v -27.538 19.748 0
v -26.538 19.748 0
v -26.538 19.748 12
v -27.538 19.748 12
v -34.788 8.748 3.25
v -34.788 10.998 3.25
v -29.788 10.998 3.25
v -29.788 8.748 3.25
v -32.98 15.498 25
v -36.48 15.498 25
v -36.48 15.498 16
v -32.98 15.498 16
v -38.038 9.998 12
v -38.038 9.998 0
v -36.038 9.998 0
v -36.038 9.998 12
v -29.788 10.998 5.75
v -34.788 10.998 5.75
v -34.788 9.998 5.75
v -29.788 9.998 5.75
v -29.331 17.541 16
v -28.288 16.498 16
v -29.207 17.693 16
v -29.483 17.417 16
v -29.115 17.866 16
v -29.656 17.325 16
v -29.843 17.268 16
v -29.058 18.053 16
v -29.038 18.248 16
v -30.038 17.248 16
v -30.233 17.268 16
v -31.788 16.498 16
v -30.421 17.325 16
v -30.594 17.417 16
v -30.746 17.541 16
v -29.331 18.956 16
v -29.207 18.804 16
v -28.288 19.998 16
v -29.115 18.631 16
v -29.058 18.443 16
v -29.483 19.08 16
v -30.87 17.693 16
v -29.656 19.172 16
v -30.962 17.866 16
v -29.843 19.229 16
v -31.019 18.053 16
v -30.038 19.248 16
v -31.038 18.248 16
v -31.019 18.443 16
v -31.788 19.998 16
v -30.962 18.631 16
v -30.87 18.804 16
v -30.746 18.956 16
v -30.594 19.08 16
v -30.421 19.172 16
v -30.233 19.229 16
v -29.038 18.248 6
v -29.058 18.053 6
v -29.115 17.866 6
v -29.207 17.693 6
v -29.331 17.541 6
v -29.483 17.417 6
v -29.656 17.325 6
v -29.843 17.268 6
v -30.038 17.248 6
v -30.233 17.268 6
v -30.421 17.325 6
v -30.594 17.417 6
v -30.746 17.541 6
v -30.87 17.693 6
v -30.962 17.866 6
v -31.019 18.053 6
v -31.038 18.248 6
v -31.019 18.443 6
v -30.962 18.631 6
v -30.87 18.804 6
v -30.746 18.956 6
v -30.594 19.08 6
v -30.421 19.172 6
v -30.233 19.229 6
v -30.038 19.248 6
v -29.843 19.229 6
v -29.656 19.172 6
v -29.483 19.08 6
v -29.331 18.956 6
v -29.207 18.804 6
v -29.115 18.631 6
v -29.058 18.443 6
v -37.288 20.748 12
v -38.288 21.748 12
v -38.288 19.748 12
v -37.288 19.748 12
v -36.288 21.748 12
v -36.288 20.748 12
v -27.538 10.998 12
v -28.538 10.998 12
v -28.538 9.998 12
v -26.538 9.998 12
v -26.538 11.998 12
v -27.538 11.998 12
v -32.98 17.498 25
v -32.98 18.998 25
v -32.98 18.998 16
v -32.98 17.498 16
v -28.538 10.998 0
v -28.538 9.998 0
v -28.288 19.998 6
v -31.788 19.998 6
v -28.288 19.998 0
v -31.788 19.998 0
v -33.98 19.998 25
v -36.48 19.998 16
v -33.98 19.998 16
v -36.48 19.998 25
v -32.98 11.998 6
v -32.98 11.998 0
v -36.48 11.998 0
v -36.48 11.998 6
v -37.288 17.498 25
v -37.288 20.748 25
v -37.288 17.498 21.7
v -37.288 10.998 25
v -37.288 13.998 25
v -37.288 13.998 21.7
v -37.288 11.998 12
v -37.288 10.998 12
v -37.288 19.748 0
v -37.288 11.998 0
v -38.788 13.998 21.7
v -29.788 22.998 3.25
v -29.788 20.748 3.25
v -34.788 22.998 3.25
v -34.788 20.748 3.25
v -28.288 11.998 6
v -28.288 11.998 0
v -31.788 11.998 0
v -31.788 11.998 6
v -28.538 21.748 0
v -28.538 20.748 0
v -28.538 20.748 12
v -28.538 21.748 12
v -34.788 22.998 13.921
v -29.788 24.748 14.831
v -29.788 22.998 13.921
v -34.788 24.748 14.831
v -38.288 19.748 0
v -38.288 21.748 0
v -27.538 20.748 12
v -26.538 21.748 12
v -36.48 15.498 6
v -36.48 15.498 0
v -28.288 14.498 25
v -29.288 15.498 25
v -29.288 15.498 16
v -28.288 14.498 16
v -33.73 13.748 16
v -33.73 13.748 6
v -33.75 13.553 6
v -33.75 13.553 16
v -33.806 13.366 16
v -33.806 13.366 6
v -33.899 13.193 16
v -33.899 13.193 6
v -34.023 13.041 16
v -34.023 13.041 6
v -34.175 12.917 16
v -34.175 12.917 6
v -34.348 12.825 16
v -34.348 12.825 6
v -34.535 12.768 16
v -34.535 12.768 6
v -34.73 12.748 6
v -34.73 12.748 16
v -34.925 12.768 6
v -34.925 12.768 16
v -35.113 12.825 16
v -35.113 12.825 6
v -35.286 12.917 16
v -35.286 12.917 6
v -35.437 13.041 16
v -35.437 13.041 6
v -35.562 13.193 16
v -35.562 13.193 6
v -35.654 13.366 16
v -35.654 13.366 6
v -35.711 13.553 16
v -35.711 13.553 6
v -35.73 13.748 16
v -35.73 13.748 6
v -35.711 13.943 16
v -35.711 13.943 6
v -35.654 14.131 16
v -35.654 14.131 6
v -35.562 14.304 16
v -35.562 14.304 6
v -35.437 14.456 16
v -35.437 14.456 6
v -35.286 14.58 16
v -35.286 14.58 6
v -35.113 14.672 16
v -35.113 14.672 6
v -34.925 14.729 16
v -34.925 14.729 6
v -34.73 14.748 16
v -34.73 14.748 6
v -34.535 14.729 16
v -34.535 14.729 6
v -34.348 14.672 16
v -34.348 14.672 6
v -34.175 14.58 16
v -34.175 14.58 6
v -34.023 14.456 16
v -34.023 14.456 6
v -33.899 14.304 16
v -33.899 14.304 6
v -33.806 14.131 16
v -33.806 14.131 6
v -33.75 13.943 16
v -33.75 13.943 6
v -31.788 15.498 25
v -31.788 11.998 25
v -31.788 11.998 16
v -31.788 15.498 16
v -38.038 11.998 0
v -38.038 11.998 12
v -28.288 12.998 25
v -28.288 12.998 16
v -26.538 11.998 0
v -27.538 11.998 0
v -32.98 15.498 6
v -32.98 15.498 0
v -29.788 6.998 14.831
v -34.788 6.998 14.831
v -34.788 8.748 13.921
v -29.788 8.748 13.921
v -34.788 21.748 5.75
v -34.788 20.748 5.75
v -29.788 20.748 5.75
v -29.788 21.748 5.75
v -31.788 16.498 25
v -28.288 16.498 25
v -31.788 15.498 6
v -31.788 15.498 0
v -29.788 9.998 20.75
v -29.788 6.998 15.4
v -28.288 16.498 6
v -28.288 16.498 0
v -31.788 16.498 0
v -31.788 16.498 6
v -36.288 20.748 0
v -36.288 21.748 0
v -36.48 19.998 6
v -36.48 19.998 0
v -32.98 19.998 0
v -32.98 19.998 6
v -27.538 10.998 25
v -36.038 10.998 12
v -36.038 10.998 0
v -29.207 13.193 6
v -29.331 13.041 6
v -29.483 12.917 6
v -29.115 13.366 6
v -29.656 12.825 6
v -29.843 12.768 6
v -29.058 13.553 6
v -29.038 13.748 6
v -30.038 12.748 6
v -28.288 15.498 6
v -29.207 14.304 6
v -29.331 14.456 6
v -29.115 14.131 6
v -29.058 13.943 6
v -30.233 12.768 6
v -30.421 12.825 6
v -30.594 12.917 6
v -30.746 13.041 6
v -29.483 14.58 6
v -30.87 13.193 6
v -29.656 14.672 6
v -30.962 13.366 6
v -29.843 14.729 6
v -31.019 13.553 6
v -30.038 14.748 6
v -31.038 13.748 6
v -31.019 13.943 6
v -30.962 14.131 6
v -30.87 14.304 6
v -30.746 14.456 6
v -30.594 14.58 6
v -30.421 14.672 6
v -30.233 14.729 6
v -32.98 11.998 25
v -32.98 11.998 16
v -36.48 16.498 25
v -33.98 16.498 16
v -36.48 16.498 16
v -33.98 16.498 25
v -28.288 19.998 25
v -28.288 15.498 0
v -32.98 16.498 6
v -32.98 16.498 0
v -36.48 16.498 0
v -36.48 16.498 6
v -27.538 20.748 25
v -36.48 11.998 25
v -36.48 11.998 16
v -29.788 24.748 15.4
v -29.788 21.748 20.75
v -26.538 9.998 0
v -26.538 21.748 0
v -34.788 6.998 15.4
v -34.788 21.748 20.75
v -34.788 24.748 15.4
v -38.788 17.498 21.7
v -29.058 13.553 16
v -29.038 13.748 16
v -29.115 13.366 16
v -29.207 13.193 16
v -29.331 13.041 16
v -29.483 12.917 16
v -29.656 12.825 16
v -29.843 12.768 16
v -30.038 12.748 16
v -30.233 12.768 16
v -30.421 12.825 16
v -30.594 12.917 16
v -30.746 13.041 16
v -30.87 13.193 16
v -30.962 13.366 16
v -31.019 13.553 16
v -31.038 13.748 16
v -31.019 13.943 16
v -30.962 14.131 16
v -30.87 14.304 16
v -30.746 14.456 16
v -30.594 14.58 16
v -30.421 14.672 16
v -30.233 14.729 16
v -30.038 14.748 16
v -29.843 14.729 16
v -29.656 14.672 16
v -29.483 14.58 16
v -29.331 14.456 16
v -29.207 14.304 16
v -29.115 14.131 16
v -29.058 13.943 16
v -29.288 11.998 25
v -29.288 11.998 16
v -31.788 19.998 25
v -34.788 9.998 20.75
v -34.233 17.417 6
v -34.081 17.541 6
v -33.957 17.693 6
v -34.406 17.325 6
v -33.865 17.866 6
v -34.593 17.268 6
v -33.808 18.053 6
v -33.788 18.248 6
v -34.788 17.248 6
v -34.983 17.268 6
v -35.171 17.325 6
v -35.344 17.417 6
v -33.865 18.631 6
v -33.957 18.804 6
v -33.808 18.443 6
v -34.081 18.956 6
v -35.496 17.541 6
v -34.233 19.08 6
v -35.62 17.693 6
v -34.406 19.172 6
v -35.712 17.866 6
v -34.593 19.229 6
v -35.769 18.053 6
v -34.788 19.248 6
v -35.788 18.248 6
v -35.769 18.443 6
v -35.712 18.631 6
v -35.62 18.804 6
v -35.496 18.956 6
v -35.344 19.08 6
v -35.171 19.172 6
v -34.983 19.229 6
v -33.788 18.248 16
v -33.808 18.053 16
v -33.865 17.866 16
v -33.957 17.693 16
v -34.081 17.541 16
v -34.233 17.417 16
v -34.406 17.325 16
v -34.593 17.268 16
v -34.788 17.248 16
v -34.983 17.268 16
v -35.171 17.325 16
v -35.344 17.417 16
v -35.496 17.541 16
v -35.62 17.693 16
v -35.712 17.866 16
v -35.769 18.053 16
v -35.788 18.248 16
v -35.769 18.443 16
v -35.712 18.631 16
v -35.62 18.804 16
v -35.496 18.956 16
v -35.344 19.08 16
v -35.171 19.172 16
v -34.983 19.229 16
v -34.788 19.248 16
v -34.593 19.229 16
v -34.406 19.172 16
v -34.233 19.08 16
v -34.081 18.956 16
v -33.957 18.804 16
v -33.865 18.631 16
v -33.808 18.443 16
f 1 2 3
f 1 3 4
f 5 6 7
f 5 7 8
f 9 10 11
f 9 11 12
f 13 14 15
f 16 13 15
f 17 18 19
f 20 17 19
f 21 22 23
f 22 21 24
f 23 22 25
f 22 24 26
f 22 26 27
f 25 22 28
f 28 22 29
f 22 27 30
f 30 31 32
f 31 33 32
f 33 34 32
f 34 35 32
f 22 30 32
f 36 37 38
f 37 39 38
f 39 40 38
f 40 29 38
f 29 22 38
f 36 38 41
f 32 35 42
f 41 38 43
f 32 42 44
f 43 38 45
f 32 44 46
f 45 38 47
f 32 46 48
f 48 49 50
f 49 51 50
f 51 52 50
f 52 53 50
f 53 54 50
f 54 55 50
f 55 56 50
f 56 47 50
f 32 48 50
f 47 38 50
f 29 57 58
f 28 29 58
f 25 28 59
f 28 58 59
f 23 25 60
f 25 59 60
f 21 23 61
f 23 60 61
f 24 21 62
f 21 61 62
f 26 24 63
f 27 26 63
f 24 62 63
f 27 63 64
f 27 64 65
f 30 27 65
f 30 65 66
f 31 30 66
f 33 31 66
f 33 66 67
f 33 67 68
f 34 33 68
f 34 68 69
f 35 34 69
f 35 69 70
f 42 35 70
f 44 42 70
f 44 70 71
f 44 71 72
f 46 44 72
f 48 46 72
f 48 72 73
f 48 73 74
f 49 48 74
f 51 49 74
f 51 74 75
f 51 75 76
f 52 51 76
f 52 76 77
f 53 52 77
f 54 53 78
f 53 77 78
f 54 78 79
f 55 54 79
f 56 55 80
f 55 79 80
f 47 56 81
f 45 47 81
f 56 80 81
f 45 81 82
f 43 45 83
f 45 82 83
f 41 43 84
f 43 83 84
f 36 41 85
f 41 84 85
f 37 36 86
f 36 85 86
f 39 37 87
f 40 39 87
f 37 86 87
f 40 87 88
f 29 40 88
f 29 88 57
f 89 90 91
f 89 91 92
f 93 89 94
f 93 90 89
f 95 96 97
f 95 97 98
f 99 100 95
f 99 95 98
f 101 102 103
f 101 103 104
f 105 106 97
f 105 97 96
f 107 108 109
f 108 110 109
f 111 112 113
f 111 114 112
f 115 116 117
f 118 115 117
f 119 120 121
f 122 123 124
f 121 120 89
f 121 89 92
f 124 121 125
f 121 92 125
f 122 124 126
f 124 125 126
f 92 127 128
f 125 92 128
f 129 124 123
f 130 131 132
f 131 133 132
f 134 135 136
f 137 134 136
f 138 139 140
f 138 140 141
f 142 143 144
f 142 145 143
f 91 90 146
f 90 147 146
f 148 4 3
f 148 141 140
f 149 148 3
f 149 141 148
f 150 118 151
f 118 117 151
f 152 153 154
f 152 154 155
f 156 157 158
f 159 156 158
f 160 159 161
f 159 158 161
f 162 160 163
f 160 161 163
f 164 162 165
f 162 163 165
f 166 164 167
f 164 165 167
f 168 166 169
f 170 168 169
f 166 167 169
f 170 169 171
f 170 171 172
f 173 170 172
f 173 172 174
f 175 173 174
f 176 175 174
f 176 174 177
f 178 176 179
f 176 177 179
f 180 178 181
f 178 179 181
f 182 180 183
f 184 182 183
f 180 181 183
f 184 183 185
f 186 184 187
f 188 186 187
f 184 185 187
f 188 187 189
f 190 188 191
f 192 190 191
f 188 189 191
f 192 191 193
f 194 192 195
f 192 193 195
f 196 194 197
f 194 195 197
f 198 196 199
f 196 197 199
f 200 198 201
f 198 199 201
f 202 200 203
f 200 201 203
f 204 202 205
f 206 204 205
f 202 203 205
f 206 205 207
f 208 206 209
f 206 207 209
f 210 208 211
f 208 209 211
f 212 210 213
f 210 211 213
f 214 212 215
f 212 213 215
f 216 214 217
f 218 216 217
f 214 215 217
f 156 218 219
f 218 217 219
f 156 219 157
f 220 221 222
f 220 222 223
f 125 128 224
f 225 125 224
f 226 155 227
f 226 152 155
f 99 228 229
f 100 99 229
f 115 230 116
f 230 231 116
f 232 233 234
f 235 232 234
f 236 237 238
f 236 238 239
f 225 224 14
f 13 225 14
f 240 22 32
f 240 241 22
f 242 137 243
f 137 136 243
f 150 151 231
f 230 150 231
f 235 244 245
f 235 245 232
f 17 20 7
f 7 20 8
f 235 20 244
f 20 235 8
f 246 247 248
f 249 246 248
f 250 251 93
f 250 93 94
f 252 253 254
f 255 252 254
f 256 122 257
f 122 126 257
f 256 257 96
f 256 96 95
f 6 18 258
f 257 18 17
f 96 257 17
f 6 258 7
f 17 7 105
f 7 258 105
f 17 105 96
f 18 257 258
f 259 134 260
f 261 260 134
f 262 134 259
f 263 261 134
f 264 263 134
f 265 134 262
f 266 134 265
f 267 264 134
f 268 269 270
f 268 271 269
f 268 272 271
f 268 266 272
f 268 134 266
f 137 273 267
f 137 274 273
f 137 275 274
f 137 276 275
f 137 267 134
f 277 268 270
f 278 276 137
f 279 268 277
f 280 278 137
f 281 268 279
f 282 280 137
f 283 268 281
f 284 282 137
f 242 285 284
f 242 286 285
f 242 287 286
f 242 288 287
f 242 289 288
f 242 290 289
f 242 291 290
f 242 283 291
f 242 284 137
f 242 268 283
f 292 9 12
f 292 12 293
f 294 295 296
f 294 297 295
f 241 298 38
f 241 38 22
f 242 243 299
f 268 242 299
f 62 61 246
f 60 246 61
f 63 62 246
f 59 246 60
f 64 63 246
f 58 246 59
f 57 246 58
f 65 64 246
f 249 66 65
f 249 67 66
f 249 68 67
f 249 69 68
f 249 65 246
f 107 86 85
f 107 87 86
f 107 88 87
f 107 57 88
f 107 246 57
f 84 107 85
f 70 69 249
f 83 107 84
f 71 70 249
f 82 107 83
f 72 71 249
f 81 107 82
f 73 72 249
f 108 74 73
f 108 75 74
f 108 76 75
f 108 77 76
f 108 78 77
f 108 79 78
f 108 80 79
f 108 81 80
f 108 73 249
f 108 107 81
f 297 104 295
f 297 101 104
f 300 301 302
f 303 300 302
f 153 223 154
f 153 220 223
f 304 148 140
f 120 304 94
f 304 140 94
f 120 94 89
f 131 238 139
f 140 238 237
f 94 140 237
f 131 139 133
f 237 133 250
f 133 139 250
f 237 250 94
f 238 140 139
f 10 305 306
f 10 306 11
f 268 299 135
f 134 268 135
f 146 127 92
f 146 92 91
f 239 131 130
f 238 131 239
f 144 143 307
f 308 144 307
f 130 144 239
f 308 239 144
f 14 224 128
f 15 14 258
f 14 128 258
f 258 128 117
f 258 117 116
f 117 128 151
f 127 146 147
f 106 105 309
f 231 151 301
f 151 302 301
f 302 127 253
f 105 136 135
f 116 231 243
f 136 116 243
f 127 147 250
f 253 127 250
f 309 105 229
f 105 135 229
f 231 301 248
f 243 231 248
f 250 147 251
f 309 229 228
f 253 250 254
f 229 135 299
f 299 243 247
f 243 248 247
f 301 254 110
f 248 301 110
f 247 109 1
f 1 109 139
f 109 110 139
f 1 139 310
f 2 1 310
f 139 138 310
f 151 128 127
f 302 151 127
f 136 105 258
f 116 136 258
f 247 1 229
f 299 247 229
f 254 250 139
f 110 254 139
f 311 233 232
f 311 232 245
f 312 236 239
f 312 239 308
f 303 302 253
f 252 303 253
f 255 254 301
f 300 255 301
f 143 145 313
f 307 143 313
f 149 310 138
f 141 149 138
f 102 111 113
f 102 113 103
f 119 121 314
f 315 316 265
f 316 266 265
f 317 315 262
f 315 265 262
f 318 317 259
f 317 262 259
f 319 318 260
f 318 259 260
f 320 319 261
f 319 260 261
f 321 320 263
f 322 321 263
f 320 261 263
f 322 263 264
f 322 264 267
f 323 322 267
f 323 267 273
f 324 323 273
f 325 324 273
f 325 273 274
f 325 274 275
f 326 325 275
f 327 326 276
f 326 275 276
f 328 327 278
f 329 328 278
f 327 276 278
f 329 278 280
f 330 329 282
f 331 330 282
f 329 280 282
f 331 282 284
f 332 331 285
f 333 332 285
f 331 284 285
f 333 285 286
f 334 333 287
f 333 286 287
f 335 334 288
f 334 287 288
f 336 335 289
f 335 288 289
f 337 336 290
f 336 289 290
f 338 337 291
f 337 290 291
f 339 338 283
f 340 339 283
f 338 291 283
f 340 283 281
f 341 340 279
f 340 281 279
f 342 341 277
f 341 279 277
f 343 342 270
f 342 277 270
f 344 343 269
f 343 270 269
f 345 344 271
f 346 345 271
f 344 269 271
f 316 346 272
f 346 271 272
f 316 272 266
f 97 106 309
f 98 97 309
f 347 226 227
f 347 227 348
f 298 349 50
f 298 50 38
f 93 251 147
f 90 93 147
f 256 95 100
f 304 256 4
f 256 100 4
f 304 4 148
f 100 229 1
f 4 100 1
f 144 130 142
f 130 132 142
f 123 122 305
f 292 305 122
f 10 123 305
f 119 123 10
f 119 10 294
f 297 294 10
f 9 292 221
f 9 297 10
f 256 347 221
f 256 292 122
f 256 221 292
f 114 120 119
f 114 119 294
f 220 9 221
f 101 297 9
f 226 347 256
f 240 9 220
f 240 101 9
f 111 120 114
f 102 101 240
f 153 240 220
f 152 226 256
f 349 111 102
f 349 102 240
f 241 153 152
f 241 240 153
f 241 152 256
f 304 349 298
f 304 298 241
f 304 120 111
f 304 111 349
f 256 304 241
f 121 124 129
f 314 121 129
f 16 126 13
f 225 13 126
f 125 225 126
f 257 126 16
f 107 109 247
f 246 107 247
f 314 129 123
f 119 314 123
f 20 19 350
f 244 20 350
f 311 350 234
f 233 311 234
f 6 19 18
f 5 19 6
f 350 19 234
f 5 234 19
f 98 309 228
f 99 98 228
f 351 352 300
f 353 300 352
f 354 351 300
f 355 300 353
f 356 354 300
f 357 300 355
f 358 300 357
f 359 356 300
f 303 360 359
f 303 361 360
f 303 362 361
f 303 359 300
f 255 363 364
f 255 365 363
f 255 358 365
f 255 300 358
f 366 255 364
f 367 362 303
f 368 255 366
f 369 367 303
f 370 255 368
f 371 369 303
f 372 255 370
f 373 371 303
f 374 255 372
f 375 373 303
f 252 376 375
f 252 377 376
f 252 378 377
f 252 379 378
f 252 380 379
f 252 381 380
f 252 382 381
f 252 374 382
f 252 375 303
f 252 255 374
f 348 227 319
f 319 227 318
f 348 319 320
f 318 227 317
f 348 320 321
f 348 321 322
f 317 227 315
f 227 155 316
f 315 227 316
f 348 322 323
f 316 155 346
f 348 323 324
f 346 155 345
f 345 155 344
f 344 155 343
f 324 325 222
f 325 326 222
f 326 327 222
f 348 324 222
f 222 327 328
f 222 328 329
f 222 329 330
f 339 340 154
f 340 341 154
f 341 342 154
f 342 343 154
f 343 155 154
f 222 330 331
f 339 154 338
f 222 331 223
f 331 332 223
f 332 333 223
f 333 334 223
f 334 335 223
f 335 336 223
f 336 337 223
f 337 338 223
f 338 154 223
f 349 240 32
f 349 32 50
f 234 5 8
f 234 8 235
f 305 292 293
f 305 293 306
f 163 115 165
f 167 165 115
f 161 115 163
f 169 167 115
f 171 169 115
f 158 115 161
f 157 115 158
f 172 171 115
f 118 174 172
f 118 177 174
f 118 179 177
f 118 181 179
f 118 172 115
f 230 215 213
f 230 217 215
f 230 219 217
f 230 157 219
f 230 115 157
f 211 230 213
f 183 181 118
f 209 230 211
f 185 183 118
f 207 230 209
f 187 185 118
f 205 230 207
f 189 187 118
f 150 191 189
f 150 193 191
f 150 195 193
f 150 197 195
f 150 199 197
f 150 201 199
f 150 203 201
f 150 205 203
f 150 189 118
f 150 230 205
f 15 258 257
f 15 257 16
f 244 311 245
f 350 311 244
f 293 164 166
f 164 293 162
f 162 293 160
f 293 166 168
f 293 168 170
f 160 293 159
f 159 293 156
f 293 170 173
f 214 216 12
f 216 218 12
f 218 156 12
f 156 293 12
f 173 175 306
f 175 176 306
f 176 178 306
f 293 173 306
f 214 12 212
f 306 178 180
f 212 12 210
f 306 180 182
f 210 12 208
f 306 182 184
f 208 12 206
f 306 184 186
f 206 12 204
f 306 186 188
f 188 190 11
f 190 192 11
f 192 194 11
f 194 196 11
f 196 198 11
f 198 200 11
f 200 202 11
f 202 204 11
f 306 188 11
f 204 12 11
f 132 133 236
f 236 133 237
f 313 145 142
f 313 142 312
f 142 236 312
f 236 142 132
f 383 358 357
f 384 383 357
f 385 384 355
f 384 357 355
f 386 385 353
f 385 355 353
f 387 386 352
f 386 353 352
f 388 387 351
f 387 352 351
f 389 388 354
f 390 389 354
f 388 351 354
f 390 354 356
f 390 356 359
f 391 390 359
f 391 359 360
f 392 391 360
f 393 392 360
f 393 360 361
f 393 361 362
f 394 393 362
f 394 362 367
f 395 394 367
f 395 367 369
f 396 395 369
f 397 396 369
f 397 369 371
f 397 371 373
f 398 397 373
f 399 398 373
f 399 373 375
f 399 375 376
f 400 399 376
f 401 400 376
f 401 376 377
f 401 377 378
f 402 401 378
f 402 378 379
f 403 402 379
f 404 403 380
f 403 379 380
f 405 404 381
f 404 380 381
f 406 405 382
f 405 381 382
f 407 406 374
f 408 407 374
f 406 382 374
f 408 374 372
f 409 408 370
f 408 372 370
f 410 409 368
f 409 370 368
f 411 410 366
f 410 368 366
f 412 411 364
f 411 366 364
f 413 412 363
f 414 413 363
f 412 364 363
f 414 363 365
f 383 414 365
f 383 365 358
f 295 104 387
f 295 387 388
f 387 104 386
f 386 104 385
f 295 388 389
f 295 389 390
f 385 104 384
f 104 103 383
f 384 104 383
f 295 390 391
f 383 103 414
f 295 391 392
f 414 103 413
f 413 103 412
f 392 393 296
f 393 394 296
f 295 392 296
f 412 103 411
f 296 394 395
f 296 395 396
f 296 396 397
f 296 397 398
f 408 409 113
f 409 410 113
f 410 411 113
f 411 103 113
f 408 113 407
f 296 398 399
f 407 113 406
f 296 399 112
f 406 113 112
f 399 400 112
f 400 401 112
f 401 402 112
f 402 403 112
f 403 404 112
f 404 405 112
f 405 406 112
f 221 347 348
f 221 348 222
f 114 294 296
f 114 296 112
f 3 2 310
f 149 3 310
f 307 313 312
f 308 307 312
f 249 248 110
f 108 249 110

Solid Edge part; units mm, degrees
sketch "Sketch1" plane through (0, 0, 0) normal (0, 0, 1) x (1, 0, 0)
  line L0 (-37.2884, 10.9984) -> (-27.5384, 10.9984)
  line L1 (-27.5384, 10.9984) -> (-27.5384, 20.7484)
  line L2 (-27.5384, 20.7484) -> (-37.2884, 20.7484)
  line L3 (-37.2884, 20.7484) -> (-37.2884, 10.9984)
  dimension "D1" = 9.75
  dimension "D2" = 9.75
extrude "Protrusion1" add sketch "Sketch1" along normal blind 25
sketch "Sketch2" plane through (-32.5384, 13.9984, 12.5) normal (0, -1, 0) x (0, 0, 1)
  line L0 (12.5, 4.75) -> (9.2, 4.75)
  line L1 (9.2, 4.75) -> (9.2, 6.25)
  line L2 (9.2, 6.25) -> (12.5, 4.75)
extrude "ExtrudedProtrusion_3" add sketch "Sketch2" against normal blind 3.5
sketch "Sketch3" plane through (-32.5384, 17.4984, 0) normal (0, 0, -1) x (0, 1, 0)
  line L0 (4.25, -3.75) -> (4.25, -5.75)
  line L1 (4.25, -5.75) -> (2.25, -5.75)
  line L2 (2.25, -3.75) -> (2.25, -5.75)
  line L3 (4.25, -3.75) -> (2.25, -3.75)
  line L4 (-5.5, -5.5) -> (-7.5, -5.5)
  line L5 (-7.5, -5.5) -> (-7.5, -3.5)
  line L6 (-5.5, -3.5) -> (-7.5, -3.5)
  line L7 (-5.5, -3.5) -> (-5.5, -5.5)
  line L8 (-7.5, 4) -> (-7.5, 6)
  line L9 (-7.5, 6) -> (-5.5, 6)
  line L10 (-5.5, 6) -> (-5.5, 4)
  line L11 (-7.5, 4) -> (-5.5, 4)
  line L12 (2.25, 6) -> (4.25, 6)
  line L13 (4.25, 6) -> (4.25, 4)
  line L14 (2.25, 4) -> (4.25, 4)
  line L15 (2.25, 6) -> (2.25, 4)
  dimension "D1" = 11.5
  dimension "D2" = 2
  dimension "D3" = 2
  dimension "D4" = 2
  dimension "D5" = 2
  dimension "D6" = 2
  dimension "D7" = 2
  dimension "D8" = 2
  dimension "D9" = 1
  dimension "D10" = 1
  dimension "D11" = 11.75
  dimension "D12" = 11.75
  dimension "D13" = 1
  dimension "D14" = 2
  dimension "D15" = 1
extrude "ExtrudedProtrusion_4" add sketch "Sketch3" against normal blind 12
sketch "Sketch4" plane through (-32.2884, 17.4984, 12.5) normal (1, 0, 0) x (0, -1, 0)
  line L0 (6.5, 9.25) -> (8.75, 9.25)
  line L1 (8.75, 9.25) -> (8.75, -1.4212)
  line L2 (10.5, -2.3314) -> (8.75, -1.4212)
  line L3 (10.5, -2.3314) -> (10.5, -2.9)
  line L4 (10.5, -2.9) -> (7.5, -8.25)
  line L5 (7.5, 6.75) -> (7.5, -8.25)
  line L6 (6.5, 6.75) -> (7.5, 6.75)
  line L7 (6.5, 9.25) -> (6.5, 6.75)
  line L8 (-3.25, 9.25) -> (-5.5, 9.25)
  line L9 (-5.5, 9.25) -> (-5.5, -1.4212)
  line L10 (-7.25, -2.3314) -> (-5.5, -1.4212)
  line L11 (-7.25, -2.3314) -> (-7.25, -2.9)
  line L12 (-7.25, -2.9) -> (-4.25, -8.25)
  line L13 (-4.25, 6.75) -> (-4.25, -8.25)
  line L14 (-3.25, 6.75) -> (-4.25, 6.75)
  line L15 (-3.25, 9.25) -> (-3.25, 6.75)
  dimension "D1" = 3.25
  dimension "D2" = 2.5
  dimension "D3" = 3
extrude "ExtrudedProtrusion_5" add sketch "Sketch4" along normal mid plane 5
sketch "Sketch5" plane through (-32.5384, 17.4984, 25) normal (0, 0, 1) x (0, 1, 0)
  line L0 (-1, -0.75) -> (2.5, -0.75)
  line L1 (2.5, -0.75) -> (2.5, -4.25)
  line L2 (2.5, -4.25) -> (-1, -4.25)
  line L3 (-1, -4.25) -> (-1, -0.75)
  line L4 (-1, 3.9418) -> (2.5, 3.9418)
  line L5 (2.5, 3.9418) -> (2.5, 1.4418)
  line L6 (2.5, 1.4418) -> (1.5, 0.4418)
  line L7 (1.5, 0.4418) -> (0, 0.4418)
  line L8 (0, 0.4418) -> (-1, 1.4418)
  line L9 (-1, 1.4418) -> (-1, 3.9418)
  line L10 (-5.5, 3.9418) -> (-2, 3.9418)
  line L11 (-2, 3.9418) -> (-2, 0.4418)
  line L12 (-2, 0.4418) -> (-5.5, 0.4418)
  line L13 (-5.5, 0.4418) -> (-5.5, 3.9418)
  line L14 (-5.5, -0.75) -> (-2, -0.75)
  line L15 (-2, -0.75) -> (-2, -3.25)
  line L16 (-2, -3.25) -> (-3, -4.25)
  line L17 (-3, -4.25) -> (-4.5, -4.25)
  line L18 (-4.5, -4.25) -> (-5.5, -3.25)
  line L19 (-5.5, -3.25) -> (-5.5, -0.75)
  dimension "D1" = 3.5
  dimension "D2" = 3.5
  dimension "D3" = 1
  dimension "D4" = 0.75
  dimension "D5" = 3.5
  dimension "D6" = 3.5
  dimension "D7" = 2.5
  dimension "D8" = 3.5
  dimension "D9" = 3.5
  dimension "D10" = 3.5
  dimension "D11" = 1
  dimension "D12" = 1
  dimension "D13" = 1
extrude "ExtrudedCutout_1" cut sketch "Sketch5" against normal blind 9
sketch "Sketch6" plane through (-32.5384, 17.4984, 0) normal (0, 0, -1) x (-1, 0, 0)
  line L0 (3.9419, -2) -> (0.4419, -2)
  line L1 (0.4419, -2) -> (0.4419, -5.5)
  line L2 (0.4419, -5.5) -> (3.9419, -5.5)
  line L3 (3.9419, -5.5) -> (3.9419, -2)
  line L4 (-0.75, -2) -> (-4.25, -2)
  line L5 (-4.25, -2) -> (-4.25, -5.5)
  line L6 (-4.25, -5.5) -> (-0.75, -5.5)
  line L7 (-0.75, -5.5) -> (-0.75, -2)
  line L8 (-0.75, 2.5) -> (-4.25, 2.5)
  line L9 (-4.25, 2.5) -> (-4.25, -1)
  line L10 (-4.25, -1) -> (-0.75, -1)
  line L11 (-0.75, -1) -> (-0.75, 2.5)
  line L12 (3.9419, 2.5) -> (0.4419, 2.5)
  line L13 (0.4419, 2.5) -> (0.4419, -1)
  line L14 (0.4419, -1) -> (3.9419, -1)
  line L15 (3.9419, -1) -> (3.9419, 2.5)
extrude "ExtrudedCutout_2" cut sketch "Sketch6" against normal blind 6
sketch "Sketch7" plane through (-34.7303, 13.7484, 6) normal (0, 0, -1) x (1, 0, 0)
  circle A0 centre (0, 0) radius 1
  circle A1 centre (4.6919, 0) radius 1
  circle A2 centre (4.6919, -4.5) radius 1
  circle A3 centre (-0.0581, -4.5) radius 1
extrude "Cutout1" cut sketch "Sketch7" against normal through all
